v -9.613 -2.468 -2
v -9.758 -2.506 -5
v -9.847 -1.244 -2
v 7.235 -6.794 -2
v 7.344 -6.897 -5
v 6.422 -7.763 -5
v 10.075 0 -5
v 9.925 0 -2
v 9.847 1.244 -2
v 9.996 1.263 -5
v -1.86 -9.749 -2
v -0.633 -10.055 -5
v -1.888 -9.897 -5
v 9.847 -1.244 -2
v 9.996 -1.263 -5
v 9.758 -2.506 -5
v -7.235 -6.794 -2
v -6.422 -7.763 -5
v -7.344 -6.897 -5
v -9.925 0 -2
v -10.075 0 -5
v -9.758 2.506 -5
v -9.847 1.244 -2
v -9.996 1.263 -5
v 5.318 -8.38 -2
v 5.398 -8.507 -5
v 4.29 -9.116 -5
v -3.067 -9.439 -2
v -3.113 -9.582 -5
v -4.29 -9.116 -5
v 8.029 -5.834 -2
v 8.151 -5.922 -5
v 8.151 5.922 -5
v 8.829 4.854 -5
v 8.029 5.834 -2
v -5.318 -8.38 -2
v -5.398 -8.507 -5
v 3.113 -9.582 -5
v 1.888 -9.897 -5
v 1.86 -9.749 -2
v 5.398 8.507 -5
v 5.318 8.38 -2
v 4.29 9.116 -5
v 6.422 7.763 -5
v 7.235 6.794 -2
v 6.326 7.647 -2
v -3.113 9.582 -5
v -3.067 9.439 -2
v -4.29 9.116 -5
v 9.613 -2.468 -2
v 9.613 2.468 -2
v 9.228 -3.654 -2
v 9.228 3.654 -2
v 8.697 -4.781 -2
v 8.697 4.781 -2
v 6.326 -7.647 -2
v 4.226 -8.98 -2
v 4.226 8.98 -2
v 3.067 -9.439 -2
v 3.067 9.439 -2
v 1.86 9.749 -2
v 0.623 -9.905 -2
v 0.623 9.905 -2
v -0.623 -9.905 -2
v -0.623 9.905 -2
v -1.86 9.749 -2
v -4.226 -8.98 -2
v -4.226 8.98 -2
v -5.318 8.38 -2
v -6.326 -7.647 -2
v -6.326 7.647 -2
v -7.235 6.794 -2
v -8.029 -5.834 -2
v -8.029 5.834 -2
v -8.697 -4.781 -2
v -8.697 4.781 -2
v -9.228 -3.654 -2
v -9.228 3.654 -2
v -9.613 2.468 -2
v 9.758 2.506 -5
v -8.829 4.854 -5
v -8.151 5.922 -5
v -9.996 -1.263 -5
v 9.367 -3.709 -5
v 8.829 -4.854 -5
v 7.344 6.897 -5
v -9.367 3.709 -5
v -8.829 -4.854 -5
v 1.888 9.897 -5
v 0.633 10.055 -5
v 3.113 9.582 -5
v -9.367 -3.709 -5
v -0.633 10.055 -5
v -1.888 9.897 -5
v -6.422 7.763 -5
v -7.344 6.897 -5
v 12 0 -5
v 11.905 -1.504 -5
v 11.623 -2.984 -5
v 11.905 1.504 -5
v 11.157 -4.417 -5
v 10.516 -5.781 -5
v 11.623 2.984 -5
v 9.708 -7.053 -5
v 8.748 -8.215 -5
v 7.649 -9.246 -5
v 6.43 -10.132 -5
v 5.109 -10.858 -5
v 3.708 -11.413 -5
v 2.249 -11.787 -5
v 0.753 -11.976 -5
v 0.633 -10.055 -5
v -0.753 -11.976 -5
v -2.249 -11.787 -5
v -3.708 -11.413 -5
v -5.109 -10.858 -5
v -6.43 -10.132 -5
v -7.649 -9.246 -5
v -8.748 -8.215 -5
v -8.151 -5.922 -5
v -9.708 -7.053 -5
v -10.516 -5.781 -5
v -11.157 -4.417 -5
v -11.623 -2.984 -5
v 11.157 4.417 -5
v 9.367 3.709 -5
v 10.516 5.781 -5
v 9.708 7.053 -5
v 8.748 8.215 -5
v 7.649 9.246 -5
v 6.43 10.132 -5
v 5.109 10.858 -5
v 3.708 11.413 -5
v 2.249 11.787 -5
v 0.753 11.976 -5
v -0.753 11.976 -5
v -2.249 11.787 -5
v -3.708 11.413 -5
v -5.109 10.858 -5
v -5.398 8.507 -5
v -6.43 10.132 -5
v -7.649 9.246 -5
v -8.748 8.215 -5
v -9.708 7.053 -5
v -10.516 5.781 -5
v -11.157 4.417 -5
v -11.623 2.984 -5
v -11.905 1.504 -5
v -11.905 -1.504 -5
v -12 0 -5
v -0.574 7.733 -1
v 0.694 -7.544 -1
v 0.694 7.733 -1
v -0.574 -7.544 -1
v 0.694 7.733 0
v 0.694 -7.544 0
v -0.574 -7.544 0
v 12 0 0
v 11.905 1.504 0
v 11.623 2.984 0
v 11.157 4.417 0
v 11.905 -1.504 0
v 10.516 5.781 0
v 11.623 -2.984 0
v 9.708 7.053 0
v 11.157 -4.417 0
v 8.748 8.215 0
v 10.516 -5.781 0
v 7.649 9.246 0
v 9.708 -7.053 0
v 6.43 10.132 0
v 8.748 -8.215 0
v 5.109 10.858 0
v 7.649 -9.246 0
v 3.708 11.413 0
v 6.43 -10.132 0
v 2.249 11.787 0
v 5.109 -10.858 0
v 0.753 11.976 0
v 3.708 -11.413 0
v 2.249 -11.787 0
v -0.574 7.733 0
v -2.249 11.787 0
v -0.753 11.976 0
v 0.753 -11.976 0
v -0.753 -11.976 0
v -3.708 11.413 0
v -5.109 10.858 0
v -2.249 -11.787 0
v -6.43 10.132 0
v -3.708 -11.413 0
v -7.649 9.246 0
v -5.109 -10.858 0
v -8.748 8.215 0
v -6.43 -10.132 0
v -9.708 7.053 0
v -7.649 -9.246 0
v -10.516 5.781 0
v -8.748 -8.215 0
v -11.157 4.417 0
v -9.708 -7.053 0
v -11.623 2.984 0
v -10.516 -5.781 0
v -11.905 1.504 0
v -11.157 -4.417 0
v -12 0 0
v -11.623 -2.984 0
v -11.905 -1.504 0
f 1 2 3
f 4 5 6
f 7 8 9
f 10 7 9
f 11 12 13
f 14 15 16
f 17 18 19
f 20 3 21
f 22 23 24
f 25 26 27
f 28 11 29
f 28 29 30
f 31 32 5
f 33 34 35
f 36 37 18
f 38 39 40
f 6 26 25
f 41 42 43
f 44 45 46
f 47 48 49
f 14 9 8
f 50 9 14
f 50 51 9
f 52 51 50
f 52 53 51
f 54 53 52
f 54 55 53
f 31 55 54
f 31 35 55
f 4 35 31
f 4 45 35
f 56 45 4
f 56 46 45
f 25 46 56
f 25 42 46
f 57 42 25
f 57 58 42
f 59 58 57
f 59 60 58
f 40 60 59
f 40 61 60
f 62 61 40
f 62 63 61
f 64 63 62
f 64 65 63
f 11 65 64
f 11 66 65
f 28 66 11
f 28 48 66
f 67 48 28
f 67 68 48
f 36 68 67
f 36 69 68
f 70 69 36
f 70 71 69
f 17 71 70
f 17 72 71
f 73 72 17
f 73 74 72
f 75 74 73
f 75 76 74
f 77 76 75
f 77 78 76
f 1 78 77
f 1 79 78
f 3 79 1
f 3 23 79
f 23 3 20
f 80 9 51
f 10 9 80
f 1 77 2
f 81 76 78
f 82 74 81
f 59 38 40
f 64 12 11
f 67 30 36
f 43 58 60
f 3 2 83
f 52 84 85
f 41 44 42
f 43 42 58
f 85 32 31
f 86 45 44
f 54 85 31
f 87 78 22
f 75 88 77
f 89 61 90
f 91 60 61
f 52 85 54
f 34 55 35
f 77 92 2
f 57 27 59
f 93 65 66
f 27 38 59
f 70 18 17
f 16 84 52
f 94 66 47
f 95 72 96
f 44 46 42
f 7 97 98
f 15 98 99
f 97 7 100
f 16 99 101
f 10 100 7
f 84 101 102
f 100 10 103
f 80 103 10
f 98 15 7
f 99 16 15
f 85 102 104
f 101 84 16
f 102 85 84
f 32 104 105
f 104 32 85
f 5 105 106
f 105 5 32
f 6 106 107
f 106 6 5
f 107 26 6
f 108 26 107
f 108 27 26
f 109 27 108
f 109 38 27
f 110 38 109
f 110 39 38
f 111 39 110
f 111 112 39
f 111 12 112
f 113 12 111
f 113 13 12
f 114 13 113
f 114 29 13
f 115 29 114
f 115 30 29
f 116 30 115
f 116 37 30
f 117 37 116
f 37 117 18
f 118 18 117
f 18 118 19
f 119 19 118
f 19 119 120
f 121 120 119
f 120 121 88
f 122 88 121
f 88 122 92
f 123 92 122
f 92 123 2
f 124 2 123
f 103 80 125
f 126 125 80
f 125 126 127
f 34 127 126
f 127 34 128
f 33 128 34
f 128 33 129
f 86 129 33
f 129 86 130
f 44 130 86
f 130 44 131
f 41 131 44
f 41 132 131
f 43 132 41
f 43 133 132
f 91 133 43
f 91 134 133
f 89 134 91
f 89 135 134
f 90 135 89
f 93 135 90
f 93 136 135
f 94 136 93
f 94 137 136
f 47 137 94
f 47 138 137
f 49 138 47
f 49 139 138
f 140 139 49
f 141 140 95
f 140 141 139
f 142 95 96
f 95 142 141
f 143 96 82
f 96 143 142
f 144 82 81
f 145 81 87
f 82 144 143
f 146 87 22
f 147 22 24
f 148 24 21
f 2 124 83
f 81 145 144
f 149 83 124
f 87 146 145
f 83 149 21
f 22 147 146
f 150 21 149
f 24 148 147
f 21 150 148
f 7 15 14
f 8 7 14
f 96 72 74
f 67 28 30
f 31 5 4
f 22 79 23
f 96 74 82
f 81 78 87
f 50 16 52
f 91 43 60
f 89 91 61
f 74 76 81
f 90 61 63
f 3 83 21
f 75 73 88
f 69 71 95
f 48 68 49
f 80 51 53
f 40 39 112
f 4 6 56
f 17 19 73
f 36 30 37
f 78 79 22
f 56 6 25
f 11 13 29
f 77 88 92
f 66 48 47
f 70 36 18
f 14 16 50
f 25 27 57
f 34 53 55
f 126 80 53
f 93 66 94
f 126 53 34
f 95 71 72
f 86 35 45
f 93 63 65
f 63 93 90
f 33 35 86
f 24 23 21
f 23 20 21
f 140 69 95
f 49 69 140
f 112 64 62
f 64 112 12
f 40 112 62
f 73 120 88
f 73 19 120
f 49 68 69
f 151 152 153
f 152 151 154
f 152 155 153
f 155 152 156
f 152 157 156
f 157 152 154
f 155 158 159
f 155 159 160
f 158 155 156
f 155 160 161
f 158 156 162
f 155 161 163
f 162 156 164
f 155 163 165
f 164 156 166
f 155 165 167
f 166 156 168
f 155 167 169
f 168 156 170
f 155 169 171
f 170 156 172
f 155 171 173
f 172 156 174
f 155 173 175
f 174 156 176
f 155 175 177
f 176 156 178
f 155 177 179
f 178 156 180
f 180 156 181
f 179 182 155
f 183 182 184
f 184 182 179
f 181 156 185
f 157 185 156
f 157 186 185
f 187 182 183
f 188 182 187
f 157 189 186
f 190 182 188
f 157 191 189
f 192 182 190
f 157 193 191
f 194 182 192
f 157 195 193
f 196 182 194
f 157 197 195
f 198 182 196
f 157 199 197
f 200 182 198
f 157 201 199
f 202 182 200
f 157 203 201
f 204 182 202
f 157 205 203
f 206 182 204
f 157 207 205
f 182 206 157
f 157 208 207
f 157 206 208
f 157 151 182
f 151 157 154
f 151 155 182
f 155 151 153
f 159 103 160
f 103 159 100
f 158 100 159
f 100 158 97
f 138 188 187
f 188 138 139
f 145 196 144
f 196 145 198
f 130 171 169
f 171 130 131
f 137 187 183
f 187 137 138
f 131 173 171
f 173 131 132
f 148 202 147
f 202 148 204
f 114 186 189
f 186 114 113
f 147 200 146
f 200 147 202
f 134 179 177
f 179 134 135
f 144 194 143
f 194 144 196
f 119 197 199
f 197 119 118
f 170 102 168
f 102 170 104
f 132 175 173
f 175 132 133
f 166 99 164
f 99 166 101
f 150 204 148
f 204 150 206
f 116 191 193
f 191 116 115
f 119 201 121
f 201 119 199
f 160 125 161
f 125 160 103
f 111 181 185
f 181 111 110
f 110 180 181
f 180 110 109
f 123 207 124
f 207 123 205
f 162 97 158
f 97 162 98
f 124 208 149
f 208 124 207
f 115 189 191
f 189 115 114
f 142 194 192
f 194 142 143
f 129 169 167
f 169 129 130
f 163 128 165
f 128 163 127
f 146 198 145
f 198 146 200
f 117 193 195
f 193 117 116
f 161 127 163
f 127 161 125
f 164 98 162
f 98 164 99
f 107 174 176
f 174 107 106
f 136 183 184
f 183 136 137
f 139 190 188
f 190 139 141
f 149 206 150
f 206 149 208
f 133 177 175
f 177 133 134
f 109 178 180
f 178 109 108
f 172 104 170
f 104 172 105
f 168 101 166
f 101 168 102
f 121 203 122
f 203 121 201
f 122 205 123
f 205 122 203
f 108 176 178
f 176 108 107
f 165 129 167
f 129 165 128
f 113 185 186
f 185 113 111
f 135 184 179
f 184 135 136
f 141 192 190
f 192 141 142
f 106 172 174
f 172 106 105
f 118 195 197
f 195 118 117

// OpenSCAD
$fn = 50;

difference() {
	union() {
		translate(v = [0, 0, -5.0]) {
			cylinder(h = 5, r = 12.0);
		}
	}
	union() {
		#translate(v = [0, 0, -5.0]) {
			cylinder(h = 3, r1 = 10.075, r2 = 9.925);
		}
		translate(v = [0, 0, -1]) {
			linear_extrude(height = 1) {
				text(font = "Wingdings", halign = "center", size = 11, text = "|", valign = "center");
			}
		}
	}
}
